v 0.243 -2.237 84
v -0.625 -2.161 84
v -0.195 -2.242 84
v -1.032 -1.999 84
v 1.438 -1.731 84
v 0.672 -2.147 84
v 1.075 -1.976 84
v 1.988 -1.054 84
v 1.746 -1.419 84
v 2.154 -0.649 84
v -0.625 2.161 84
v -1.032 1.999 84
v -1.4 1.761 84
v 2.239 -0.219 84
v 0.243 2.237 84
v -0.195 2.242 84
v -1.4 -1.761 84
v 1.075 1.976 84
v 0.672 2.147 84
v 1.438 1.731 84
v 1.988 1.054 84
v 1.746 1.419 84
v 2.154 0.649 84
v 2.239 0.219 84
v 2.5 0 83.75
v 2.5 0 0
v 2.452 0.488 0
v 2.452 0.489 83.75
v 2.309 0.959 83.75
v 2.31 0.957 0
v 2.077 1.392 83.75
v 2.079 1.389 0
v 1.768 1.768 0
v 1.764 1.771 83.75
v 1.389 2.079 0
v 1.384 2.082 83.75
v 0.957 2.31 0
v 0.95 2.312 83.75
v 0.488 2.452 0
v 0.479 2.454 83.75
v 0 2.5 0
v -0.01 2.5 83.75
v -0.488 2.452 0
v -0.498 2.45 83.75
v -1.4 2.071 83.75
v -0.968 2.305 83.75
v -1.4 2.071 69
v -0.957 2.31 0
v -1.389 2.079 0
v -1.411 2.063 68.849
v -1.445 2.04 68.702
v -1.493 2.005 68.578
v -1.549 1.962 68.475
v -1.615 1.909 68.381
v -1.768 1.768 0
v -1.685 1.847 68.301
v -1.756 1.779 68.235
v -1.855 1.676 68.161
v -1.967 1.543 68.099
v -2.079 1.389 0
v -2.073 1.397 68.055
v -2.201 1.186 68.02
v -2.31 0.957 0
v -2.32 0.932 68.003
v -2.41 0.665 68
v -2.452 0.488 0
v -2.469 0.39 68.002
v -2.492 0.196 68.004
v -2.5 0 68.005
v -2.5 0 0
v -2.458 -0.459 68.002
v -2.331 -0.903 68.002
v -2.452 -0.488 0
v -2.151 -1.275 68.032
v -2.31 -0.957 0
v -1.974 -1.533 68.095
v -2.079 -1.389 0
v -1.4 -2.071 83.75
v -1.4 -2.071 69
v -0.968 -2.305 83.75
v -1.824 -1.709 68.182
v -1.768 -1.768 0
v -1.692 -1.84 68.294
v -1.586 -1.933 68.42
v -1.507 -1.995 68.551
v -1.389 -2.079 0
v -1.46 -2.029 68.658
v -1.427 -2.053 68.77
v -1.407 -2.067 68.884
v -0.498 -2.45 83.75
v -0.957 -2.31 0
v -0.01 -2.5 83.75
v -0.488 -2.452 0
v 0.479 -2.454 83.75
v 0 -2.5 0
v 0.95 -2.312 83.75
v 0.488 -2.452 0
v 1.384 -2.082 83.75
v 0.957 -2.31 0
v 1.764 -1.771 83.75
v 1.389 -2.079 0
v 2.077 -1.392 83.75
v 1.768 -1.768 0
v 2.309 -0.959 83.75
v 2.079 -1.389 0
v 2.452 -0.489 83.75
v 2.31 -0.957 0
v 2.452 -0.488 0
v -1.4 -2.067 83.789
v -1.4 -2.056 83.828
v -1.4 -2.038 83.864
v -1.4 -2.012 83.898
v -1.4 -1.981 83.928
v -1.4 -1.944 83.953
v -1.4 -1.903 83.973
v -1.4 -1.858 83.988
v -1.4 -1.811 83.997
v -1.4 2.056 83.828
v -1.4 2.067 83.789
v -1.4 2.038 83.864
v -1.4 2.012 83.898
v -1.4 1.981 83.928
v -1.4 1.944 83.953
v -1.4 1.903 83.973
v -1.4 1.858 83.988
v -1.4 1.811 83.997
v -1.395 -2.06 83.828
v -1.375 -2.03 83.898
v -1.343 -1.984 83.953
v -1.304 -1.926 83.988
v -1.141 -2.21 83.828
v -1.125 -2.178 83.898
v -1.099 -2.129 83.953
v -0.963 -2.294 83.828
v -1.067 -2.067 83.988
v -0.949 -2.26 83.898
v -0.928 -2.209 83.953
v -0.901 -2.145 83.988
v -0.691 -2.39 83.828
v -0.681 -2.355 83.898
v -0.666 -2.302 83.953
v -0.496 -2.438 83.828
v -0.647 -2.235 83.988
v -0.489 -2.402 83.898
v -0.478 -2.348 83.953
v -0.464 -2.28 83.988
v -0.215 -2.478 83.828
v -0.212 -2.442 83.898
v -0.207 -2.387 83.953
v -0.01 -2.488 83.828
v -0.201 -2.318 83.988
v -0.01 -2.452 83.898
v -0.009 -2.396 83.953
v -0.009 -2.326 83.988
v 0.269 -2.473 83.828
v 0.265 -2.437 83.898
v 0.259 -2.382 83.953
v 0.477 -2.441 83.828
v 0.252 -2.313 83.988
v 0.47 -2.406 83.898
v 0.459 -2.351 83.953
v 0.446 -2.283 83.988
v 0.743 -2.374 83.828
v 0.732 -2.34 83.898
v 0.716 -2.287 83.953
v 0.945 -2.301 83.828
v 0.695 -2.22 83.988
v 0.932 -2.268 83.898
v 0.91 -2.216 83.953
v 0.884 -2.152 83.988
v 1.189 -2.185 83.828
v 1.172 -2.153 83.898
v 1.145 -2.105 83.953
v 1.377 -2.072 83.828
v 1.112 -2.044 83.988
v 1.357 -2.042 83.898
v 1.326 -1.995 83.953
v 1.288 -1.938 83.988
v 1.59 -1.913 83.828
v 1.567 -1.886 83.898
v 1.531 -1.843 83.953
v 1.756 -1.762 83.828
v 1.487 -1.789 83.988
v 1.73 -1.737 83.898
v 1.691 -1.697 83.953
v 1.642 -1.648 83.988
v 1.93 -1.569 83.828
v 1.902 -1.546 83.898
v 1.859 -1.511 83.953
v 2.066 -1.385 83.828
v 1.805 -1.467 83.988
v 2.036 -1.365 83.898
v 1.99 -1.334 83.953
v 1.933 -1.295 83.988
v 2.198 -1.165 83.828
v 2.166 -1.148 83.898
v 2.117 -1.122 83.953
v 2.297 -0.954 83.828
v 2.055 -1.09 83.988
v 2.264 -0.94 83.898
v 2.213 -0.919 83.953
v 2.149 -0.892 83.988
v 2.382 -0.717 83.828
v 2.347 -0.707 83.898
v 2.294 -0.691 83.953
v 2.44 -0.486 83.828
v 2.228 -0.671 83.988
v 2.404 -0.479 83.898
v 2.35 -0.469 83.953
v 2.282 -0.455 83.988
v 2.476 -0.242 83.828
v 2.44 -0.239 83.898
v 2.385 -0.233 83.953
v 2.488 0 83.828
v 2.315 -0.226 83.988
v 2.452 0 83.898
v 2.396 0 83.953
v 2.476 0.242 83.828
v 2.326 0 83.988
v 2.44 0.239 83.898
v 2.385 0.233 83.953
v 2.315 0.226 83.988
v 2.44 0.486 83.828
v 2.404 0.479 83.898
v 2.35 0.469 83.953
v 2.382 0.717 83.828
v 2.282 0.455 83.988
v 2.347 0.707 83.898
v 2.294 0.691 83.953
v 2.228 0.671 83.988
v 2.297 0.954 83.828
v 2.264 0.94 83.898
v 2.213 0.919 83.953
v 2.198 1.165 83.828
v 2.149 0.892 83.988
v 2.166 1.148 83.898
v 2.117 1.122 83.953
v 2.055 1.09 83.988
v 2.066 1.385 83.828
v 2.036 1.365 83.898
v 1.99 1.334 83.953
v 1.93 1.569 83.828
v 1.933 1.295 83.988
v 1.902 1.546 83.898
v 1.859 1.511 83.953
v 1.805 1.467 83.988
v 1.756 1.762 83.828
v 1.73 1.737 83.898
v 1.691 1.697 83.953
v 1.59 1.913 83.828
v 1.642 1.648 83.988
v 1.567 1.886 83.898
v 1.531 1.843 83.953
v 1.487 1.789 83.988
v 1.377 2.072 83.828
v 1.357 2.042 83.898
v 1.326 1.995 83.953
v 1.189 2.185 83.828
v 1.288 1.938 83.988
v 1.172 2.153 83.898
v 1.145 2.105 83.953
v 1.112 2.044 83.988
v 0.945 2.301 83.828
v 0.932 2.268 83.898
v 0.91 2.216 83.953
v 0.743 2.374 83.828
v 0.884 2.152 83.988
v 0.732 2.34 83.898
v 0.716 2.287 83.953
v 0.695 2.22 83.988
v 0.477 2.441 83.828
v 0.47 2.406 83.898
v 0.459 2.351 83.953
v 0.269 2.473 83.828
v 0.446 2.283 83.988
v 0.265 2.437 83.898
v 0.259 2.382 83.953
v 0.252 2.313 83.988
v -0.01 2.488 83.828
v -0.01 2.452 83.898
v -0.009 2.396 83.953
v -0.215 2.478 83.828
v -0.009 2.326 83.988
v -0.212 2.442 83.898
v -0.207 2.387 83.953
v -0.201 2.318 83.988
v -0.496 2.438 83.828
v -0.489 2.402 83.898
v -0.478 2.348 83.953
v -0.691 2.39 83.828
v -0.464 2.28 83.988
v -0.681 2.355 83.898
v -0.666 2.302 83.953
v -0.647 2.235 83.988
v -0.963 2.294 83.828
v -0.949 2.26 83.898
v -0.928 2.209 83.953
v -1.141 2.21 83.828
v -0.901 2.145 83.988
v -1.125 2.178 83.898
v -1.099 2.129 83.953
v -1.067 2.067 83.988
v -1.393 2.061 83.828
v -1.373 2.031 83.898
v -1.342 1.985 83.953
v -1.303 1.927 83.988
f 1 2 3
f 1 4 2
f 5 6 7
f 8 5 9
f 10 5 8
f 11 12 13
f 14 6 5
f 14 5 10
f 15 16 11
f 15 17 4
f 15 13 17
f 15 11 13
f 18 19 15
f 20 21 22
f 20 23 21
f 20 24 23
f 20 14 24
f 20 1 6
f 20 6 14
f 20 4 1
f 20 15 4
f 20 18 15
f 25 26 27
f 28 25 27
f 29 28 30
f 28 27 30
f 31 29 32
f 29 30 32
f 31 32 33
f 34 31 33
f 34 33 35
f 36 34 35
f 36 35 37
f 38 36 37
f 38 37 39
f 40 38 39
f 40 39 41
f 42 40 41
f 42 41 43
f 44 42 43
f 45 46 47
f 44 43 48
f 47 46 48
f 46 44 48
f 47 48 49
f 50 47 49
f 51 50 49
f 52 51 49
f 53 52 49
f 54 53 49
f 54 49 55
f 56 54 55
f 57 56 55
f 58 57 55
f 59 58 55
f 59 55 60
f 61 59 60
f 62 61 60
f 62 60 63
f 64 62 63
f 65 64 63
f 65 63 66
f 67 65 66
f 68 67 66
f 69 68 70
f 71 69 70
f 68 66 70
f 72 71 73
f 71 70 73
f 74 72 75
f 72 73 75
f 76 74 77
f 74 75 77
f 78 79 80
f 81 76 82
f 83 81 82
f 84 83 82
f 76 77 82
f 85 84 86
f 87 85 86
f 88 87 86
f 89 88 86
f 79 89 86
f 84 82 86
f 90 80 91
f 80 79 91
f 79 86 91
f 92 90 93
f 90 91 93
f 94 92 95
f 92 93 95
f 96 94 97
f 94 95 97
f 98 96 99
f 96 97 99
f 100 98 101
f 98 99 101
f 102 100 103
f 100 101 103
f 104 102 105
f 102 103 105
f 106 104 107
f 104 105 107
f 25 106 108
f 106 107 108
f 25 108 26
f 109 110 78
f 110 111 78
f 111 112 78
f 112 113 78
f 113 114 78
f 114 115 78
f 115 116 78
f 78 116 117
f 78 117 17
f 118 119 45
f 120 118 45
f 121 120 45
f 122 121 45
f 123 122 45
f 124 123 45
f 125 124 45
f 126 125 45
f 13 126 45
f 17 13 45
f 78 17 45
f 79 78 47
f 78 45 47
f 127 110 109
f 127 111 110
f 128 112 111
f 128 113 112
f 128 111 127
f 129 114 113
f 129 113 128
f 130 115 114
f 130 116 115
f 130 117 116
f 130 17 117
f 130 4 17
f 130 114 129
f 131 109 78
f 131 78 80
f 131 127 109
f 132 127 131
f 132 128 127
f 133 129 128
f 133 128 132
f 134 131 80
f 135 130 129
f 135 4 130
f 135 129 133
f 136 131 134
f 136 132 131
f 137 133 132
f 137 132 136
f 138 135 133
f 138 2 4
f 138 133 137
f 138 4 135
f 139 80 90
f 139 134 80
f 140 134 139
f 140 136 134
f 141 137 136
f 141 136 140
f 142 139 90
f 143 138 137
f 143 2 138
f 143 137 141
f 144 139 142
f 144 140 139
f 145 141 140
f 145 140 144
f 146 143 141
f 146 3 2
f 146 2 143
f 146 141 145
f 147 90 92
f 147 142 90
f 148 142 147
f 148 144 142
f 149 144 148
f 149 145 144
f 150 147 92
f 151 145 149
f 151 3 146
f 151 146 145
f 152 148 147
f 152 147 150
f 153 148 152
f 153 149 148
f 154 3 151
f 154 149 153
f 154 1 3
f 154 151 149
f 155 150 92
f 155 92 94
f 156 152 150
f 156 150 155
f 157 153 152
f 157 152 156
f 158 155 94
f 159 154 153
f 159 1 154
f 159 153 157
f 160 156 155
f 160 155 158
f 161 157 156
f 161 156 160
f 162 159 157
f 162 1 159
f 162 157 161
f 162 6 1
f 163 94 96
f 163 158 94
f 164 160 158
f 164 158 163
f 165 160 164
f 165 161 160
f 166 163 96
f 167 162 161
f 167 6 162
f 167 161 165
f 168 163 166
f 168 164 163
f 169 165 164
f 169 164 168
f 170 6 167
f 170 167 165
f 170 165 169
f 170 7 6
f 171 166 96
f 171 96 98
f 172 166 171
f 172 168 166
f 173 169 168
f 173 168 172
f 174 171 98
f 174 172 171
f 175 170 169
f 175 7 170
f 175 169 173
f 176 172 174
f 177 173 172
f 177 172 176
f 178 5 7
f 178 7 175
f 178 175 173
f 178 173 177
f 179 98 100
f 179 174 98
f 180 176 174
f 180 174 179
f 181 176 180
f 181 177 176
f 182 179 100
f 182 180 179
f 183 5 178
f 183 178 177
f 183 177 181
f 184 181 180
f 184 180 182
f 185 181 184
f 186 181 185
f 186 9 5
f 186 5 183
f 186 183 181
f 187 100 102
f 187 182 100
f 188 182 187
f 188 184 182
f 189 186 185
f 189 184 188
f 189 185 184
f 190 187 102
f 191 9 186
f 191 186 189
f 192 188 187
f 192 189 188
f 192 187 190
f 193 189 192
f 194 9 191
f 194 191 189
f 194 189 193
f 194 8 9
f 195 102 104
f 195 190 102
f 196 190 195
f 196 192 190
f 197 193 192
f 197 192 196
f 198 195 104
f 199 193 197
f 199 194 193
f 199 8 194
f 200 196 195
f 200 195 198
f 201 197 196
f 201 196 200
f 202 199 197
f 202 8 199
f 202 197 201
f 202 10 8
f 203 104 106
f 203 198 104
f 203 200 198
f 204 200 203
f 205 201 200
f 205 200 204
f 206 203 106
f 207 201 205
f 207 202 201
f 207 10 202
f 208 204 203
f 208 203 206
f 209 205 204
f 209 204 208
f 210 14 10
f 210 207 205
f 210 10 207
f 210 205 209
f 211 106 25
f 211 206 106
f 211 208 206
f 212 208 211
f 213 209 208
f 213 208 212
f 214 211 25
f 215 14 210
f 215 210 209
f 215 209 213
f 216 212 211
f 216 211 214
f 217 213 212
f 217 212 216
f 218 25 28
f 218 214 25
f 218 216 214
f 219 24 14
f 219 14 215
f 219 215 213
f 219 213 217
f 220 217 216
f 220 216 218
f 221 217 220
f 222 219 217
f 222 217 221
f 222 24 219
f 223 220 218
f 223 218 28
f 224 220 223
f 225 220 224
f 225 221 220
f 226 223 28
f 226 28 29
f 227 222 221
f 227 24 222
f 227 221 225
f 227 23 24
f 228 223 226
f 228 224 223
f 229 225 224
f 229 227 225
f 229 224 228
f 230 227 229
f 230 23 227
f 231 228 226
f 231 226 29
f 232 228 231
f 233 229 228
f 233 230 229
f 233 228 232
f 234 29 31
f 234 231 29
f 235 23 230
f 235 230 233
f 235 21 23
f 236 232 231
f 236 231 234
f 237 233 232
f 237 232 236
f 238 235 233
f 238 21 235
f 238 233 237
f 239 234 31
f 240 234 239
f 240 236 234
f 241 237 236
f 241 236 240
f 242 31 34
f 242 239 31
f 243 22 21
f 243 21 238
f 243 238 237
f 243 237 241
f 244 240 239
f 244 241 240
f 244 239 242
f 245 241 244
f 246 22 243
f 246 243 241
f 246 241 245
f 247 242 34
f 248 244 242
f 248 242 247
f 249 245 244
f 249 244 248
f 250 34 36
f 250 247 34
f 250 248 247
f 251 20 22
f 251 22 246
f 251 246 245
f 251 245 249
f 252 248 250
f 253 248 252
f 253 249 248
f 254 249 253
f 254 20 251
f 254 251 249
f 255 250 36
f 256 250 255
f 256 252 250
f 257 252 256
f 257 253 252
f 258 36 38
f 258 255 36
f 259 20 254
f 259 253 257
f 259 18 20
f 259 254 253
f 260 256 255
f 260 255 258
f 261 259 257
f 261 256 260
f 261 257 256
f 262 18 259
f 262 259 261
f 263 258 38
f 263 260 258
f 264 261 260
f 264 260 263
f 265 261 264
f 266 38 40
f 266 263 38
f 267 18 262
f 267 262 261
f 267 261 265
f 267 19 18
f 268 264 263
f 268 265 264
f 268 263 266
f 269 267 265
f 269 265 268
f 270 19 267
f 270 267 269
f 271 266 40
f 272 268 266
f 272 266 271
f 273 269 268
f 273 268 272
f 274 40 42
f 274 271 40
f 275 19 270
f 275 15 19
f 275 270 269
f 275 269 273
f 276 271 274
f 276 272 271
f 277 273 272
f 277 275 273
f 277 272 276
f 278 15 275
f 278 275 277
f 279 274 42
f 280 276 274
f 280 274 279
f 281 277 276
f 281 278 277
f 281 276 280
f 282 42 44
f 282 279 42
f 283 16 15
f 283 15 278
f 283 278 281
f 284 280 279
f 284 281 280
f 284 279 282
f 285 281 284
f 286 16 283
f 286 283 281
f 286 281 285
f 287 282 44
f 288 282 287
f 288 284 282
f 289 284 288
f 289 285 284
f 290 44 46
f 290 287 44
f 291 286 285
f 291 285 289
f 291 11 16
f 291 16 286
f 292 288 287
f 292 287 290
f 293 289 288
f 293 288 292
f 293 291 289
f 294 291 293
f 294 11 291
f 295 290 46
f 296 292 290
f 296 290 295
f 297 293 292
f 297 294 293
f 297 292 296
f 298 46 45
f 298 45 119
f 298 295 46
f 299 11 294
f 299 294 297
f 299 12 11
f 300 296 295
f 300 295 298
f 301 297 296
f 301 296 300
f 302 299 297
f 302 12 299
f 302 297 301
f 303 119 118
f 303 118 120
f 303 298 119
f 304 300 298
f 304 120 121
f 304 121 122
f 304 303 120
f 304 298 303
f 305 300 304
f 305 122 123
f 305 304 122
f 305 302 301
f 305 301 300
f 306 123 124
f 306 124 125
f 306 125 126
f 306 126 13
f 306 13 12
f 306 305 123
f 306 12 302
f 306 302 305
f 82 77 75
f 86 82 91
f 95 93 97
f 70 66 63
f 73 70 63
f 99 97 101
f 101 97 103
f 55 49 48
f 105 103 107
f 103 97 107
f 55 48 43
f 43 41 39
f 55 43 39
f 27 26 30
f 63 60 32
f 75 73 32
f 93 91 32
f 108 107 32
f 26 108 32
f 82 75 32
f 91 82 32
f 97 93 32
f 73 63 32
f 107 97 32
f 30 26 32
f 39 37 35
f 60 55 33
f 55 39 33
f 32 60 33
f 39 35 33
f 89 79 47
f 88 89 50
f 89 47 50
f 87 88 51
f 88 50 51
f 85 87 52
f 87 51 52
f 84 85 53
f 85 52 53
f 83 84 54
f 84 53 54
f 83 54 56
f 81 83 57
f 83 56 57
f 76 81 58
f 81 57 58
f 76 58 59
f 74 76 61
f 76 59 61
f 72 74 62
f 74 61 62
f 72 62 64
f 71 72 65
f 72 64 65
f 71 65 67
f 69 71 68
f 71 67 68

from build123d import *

# Parameters (mm, degrees)
SKETCH1_R               = 2.5
EXTRUDE1_DEPTH          = 84
FILLET1_R               = 0.25
CUT_EXTRUDE1_DEPTH      = 3
CUT_EXTRUDE1_DEPTH_BACK = 3


with BuildPart() as part:
    # Sketch1 → Extrude1 (new body)
    with BuildSketch(Plane.XY):
        Circle(SKETCH1_R)
    extrude(amount=EXTRUDE1_DEPTH)

    # Fillet1
    fillet1_edges = [part.edges().sort_by_distance(p)[0] for p in [
        (-2.5, 0, 84),
    ]]
    fillet(fillet1_edges, radius=FILLET1_R)

    # Sketch2 → Cut-Extrude1 (cut, two sides)
    with BuildSketch(Plane(origin=(0, 0, 0), x_dir=(1, 0, 0), z_dir=(0, 1, 0))) as cut_extrude1_sk:
        with BuildLine():
            Line((-1.4, -84), (-1.4, -69))
            ThreePointArc((-1.4, -69), (-1.806967498, -68.194821478), (-2.696624903, -68.045005934))
            Line((-2.696624903, -68.045005934), (-2.696624903, -84))
            Line((-2.696624903, -84), (-1.4, -84))
        make_face()
    extrude(amount=CUT_EXTRUDE1_DEPTH, mode=Mode.SUBTRACT)
    extrude(cut_extrude1_sk.sketch, amount=-CUT_EXTRUDE1_DEPTH_BACK, mode=Mode.SUBTRACT)


solid = part.part
